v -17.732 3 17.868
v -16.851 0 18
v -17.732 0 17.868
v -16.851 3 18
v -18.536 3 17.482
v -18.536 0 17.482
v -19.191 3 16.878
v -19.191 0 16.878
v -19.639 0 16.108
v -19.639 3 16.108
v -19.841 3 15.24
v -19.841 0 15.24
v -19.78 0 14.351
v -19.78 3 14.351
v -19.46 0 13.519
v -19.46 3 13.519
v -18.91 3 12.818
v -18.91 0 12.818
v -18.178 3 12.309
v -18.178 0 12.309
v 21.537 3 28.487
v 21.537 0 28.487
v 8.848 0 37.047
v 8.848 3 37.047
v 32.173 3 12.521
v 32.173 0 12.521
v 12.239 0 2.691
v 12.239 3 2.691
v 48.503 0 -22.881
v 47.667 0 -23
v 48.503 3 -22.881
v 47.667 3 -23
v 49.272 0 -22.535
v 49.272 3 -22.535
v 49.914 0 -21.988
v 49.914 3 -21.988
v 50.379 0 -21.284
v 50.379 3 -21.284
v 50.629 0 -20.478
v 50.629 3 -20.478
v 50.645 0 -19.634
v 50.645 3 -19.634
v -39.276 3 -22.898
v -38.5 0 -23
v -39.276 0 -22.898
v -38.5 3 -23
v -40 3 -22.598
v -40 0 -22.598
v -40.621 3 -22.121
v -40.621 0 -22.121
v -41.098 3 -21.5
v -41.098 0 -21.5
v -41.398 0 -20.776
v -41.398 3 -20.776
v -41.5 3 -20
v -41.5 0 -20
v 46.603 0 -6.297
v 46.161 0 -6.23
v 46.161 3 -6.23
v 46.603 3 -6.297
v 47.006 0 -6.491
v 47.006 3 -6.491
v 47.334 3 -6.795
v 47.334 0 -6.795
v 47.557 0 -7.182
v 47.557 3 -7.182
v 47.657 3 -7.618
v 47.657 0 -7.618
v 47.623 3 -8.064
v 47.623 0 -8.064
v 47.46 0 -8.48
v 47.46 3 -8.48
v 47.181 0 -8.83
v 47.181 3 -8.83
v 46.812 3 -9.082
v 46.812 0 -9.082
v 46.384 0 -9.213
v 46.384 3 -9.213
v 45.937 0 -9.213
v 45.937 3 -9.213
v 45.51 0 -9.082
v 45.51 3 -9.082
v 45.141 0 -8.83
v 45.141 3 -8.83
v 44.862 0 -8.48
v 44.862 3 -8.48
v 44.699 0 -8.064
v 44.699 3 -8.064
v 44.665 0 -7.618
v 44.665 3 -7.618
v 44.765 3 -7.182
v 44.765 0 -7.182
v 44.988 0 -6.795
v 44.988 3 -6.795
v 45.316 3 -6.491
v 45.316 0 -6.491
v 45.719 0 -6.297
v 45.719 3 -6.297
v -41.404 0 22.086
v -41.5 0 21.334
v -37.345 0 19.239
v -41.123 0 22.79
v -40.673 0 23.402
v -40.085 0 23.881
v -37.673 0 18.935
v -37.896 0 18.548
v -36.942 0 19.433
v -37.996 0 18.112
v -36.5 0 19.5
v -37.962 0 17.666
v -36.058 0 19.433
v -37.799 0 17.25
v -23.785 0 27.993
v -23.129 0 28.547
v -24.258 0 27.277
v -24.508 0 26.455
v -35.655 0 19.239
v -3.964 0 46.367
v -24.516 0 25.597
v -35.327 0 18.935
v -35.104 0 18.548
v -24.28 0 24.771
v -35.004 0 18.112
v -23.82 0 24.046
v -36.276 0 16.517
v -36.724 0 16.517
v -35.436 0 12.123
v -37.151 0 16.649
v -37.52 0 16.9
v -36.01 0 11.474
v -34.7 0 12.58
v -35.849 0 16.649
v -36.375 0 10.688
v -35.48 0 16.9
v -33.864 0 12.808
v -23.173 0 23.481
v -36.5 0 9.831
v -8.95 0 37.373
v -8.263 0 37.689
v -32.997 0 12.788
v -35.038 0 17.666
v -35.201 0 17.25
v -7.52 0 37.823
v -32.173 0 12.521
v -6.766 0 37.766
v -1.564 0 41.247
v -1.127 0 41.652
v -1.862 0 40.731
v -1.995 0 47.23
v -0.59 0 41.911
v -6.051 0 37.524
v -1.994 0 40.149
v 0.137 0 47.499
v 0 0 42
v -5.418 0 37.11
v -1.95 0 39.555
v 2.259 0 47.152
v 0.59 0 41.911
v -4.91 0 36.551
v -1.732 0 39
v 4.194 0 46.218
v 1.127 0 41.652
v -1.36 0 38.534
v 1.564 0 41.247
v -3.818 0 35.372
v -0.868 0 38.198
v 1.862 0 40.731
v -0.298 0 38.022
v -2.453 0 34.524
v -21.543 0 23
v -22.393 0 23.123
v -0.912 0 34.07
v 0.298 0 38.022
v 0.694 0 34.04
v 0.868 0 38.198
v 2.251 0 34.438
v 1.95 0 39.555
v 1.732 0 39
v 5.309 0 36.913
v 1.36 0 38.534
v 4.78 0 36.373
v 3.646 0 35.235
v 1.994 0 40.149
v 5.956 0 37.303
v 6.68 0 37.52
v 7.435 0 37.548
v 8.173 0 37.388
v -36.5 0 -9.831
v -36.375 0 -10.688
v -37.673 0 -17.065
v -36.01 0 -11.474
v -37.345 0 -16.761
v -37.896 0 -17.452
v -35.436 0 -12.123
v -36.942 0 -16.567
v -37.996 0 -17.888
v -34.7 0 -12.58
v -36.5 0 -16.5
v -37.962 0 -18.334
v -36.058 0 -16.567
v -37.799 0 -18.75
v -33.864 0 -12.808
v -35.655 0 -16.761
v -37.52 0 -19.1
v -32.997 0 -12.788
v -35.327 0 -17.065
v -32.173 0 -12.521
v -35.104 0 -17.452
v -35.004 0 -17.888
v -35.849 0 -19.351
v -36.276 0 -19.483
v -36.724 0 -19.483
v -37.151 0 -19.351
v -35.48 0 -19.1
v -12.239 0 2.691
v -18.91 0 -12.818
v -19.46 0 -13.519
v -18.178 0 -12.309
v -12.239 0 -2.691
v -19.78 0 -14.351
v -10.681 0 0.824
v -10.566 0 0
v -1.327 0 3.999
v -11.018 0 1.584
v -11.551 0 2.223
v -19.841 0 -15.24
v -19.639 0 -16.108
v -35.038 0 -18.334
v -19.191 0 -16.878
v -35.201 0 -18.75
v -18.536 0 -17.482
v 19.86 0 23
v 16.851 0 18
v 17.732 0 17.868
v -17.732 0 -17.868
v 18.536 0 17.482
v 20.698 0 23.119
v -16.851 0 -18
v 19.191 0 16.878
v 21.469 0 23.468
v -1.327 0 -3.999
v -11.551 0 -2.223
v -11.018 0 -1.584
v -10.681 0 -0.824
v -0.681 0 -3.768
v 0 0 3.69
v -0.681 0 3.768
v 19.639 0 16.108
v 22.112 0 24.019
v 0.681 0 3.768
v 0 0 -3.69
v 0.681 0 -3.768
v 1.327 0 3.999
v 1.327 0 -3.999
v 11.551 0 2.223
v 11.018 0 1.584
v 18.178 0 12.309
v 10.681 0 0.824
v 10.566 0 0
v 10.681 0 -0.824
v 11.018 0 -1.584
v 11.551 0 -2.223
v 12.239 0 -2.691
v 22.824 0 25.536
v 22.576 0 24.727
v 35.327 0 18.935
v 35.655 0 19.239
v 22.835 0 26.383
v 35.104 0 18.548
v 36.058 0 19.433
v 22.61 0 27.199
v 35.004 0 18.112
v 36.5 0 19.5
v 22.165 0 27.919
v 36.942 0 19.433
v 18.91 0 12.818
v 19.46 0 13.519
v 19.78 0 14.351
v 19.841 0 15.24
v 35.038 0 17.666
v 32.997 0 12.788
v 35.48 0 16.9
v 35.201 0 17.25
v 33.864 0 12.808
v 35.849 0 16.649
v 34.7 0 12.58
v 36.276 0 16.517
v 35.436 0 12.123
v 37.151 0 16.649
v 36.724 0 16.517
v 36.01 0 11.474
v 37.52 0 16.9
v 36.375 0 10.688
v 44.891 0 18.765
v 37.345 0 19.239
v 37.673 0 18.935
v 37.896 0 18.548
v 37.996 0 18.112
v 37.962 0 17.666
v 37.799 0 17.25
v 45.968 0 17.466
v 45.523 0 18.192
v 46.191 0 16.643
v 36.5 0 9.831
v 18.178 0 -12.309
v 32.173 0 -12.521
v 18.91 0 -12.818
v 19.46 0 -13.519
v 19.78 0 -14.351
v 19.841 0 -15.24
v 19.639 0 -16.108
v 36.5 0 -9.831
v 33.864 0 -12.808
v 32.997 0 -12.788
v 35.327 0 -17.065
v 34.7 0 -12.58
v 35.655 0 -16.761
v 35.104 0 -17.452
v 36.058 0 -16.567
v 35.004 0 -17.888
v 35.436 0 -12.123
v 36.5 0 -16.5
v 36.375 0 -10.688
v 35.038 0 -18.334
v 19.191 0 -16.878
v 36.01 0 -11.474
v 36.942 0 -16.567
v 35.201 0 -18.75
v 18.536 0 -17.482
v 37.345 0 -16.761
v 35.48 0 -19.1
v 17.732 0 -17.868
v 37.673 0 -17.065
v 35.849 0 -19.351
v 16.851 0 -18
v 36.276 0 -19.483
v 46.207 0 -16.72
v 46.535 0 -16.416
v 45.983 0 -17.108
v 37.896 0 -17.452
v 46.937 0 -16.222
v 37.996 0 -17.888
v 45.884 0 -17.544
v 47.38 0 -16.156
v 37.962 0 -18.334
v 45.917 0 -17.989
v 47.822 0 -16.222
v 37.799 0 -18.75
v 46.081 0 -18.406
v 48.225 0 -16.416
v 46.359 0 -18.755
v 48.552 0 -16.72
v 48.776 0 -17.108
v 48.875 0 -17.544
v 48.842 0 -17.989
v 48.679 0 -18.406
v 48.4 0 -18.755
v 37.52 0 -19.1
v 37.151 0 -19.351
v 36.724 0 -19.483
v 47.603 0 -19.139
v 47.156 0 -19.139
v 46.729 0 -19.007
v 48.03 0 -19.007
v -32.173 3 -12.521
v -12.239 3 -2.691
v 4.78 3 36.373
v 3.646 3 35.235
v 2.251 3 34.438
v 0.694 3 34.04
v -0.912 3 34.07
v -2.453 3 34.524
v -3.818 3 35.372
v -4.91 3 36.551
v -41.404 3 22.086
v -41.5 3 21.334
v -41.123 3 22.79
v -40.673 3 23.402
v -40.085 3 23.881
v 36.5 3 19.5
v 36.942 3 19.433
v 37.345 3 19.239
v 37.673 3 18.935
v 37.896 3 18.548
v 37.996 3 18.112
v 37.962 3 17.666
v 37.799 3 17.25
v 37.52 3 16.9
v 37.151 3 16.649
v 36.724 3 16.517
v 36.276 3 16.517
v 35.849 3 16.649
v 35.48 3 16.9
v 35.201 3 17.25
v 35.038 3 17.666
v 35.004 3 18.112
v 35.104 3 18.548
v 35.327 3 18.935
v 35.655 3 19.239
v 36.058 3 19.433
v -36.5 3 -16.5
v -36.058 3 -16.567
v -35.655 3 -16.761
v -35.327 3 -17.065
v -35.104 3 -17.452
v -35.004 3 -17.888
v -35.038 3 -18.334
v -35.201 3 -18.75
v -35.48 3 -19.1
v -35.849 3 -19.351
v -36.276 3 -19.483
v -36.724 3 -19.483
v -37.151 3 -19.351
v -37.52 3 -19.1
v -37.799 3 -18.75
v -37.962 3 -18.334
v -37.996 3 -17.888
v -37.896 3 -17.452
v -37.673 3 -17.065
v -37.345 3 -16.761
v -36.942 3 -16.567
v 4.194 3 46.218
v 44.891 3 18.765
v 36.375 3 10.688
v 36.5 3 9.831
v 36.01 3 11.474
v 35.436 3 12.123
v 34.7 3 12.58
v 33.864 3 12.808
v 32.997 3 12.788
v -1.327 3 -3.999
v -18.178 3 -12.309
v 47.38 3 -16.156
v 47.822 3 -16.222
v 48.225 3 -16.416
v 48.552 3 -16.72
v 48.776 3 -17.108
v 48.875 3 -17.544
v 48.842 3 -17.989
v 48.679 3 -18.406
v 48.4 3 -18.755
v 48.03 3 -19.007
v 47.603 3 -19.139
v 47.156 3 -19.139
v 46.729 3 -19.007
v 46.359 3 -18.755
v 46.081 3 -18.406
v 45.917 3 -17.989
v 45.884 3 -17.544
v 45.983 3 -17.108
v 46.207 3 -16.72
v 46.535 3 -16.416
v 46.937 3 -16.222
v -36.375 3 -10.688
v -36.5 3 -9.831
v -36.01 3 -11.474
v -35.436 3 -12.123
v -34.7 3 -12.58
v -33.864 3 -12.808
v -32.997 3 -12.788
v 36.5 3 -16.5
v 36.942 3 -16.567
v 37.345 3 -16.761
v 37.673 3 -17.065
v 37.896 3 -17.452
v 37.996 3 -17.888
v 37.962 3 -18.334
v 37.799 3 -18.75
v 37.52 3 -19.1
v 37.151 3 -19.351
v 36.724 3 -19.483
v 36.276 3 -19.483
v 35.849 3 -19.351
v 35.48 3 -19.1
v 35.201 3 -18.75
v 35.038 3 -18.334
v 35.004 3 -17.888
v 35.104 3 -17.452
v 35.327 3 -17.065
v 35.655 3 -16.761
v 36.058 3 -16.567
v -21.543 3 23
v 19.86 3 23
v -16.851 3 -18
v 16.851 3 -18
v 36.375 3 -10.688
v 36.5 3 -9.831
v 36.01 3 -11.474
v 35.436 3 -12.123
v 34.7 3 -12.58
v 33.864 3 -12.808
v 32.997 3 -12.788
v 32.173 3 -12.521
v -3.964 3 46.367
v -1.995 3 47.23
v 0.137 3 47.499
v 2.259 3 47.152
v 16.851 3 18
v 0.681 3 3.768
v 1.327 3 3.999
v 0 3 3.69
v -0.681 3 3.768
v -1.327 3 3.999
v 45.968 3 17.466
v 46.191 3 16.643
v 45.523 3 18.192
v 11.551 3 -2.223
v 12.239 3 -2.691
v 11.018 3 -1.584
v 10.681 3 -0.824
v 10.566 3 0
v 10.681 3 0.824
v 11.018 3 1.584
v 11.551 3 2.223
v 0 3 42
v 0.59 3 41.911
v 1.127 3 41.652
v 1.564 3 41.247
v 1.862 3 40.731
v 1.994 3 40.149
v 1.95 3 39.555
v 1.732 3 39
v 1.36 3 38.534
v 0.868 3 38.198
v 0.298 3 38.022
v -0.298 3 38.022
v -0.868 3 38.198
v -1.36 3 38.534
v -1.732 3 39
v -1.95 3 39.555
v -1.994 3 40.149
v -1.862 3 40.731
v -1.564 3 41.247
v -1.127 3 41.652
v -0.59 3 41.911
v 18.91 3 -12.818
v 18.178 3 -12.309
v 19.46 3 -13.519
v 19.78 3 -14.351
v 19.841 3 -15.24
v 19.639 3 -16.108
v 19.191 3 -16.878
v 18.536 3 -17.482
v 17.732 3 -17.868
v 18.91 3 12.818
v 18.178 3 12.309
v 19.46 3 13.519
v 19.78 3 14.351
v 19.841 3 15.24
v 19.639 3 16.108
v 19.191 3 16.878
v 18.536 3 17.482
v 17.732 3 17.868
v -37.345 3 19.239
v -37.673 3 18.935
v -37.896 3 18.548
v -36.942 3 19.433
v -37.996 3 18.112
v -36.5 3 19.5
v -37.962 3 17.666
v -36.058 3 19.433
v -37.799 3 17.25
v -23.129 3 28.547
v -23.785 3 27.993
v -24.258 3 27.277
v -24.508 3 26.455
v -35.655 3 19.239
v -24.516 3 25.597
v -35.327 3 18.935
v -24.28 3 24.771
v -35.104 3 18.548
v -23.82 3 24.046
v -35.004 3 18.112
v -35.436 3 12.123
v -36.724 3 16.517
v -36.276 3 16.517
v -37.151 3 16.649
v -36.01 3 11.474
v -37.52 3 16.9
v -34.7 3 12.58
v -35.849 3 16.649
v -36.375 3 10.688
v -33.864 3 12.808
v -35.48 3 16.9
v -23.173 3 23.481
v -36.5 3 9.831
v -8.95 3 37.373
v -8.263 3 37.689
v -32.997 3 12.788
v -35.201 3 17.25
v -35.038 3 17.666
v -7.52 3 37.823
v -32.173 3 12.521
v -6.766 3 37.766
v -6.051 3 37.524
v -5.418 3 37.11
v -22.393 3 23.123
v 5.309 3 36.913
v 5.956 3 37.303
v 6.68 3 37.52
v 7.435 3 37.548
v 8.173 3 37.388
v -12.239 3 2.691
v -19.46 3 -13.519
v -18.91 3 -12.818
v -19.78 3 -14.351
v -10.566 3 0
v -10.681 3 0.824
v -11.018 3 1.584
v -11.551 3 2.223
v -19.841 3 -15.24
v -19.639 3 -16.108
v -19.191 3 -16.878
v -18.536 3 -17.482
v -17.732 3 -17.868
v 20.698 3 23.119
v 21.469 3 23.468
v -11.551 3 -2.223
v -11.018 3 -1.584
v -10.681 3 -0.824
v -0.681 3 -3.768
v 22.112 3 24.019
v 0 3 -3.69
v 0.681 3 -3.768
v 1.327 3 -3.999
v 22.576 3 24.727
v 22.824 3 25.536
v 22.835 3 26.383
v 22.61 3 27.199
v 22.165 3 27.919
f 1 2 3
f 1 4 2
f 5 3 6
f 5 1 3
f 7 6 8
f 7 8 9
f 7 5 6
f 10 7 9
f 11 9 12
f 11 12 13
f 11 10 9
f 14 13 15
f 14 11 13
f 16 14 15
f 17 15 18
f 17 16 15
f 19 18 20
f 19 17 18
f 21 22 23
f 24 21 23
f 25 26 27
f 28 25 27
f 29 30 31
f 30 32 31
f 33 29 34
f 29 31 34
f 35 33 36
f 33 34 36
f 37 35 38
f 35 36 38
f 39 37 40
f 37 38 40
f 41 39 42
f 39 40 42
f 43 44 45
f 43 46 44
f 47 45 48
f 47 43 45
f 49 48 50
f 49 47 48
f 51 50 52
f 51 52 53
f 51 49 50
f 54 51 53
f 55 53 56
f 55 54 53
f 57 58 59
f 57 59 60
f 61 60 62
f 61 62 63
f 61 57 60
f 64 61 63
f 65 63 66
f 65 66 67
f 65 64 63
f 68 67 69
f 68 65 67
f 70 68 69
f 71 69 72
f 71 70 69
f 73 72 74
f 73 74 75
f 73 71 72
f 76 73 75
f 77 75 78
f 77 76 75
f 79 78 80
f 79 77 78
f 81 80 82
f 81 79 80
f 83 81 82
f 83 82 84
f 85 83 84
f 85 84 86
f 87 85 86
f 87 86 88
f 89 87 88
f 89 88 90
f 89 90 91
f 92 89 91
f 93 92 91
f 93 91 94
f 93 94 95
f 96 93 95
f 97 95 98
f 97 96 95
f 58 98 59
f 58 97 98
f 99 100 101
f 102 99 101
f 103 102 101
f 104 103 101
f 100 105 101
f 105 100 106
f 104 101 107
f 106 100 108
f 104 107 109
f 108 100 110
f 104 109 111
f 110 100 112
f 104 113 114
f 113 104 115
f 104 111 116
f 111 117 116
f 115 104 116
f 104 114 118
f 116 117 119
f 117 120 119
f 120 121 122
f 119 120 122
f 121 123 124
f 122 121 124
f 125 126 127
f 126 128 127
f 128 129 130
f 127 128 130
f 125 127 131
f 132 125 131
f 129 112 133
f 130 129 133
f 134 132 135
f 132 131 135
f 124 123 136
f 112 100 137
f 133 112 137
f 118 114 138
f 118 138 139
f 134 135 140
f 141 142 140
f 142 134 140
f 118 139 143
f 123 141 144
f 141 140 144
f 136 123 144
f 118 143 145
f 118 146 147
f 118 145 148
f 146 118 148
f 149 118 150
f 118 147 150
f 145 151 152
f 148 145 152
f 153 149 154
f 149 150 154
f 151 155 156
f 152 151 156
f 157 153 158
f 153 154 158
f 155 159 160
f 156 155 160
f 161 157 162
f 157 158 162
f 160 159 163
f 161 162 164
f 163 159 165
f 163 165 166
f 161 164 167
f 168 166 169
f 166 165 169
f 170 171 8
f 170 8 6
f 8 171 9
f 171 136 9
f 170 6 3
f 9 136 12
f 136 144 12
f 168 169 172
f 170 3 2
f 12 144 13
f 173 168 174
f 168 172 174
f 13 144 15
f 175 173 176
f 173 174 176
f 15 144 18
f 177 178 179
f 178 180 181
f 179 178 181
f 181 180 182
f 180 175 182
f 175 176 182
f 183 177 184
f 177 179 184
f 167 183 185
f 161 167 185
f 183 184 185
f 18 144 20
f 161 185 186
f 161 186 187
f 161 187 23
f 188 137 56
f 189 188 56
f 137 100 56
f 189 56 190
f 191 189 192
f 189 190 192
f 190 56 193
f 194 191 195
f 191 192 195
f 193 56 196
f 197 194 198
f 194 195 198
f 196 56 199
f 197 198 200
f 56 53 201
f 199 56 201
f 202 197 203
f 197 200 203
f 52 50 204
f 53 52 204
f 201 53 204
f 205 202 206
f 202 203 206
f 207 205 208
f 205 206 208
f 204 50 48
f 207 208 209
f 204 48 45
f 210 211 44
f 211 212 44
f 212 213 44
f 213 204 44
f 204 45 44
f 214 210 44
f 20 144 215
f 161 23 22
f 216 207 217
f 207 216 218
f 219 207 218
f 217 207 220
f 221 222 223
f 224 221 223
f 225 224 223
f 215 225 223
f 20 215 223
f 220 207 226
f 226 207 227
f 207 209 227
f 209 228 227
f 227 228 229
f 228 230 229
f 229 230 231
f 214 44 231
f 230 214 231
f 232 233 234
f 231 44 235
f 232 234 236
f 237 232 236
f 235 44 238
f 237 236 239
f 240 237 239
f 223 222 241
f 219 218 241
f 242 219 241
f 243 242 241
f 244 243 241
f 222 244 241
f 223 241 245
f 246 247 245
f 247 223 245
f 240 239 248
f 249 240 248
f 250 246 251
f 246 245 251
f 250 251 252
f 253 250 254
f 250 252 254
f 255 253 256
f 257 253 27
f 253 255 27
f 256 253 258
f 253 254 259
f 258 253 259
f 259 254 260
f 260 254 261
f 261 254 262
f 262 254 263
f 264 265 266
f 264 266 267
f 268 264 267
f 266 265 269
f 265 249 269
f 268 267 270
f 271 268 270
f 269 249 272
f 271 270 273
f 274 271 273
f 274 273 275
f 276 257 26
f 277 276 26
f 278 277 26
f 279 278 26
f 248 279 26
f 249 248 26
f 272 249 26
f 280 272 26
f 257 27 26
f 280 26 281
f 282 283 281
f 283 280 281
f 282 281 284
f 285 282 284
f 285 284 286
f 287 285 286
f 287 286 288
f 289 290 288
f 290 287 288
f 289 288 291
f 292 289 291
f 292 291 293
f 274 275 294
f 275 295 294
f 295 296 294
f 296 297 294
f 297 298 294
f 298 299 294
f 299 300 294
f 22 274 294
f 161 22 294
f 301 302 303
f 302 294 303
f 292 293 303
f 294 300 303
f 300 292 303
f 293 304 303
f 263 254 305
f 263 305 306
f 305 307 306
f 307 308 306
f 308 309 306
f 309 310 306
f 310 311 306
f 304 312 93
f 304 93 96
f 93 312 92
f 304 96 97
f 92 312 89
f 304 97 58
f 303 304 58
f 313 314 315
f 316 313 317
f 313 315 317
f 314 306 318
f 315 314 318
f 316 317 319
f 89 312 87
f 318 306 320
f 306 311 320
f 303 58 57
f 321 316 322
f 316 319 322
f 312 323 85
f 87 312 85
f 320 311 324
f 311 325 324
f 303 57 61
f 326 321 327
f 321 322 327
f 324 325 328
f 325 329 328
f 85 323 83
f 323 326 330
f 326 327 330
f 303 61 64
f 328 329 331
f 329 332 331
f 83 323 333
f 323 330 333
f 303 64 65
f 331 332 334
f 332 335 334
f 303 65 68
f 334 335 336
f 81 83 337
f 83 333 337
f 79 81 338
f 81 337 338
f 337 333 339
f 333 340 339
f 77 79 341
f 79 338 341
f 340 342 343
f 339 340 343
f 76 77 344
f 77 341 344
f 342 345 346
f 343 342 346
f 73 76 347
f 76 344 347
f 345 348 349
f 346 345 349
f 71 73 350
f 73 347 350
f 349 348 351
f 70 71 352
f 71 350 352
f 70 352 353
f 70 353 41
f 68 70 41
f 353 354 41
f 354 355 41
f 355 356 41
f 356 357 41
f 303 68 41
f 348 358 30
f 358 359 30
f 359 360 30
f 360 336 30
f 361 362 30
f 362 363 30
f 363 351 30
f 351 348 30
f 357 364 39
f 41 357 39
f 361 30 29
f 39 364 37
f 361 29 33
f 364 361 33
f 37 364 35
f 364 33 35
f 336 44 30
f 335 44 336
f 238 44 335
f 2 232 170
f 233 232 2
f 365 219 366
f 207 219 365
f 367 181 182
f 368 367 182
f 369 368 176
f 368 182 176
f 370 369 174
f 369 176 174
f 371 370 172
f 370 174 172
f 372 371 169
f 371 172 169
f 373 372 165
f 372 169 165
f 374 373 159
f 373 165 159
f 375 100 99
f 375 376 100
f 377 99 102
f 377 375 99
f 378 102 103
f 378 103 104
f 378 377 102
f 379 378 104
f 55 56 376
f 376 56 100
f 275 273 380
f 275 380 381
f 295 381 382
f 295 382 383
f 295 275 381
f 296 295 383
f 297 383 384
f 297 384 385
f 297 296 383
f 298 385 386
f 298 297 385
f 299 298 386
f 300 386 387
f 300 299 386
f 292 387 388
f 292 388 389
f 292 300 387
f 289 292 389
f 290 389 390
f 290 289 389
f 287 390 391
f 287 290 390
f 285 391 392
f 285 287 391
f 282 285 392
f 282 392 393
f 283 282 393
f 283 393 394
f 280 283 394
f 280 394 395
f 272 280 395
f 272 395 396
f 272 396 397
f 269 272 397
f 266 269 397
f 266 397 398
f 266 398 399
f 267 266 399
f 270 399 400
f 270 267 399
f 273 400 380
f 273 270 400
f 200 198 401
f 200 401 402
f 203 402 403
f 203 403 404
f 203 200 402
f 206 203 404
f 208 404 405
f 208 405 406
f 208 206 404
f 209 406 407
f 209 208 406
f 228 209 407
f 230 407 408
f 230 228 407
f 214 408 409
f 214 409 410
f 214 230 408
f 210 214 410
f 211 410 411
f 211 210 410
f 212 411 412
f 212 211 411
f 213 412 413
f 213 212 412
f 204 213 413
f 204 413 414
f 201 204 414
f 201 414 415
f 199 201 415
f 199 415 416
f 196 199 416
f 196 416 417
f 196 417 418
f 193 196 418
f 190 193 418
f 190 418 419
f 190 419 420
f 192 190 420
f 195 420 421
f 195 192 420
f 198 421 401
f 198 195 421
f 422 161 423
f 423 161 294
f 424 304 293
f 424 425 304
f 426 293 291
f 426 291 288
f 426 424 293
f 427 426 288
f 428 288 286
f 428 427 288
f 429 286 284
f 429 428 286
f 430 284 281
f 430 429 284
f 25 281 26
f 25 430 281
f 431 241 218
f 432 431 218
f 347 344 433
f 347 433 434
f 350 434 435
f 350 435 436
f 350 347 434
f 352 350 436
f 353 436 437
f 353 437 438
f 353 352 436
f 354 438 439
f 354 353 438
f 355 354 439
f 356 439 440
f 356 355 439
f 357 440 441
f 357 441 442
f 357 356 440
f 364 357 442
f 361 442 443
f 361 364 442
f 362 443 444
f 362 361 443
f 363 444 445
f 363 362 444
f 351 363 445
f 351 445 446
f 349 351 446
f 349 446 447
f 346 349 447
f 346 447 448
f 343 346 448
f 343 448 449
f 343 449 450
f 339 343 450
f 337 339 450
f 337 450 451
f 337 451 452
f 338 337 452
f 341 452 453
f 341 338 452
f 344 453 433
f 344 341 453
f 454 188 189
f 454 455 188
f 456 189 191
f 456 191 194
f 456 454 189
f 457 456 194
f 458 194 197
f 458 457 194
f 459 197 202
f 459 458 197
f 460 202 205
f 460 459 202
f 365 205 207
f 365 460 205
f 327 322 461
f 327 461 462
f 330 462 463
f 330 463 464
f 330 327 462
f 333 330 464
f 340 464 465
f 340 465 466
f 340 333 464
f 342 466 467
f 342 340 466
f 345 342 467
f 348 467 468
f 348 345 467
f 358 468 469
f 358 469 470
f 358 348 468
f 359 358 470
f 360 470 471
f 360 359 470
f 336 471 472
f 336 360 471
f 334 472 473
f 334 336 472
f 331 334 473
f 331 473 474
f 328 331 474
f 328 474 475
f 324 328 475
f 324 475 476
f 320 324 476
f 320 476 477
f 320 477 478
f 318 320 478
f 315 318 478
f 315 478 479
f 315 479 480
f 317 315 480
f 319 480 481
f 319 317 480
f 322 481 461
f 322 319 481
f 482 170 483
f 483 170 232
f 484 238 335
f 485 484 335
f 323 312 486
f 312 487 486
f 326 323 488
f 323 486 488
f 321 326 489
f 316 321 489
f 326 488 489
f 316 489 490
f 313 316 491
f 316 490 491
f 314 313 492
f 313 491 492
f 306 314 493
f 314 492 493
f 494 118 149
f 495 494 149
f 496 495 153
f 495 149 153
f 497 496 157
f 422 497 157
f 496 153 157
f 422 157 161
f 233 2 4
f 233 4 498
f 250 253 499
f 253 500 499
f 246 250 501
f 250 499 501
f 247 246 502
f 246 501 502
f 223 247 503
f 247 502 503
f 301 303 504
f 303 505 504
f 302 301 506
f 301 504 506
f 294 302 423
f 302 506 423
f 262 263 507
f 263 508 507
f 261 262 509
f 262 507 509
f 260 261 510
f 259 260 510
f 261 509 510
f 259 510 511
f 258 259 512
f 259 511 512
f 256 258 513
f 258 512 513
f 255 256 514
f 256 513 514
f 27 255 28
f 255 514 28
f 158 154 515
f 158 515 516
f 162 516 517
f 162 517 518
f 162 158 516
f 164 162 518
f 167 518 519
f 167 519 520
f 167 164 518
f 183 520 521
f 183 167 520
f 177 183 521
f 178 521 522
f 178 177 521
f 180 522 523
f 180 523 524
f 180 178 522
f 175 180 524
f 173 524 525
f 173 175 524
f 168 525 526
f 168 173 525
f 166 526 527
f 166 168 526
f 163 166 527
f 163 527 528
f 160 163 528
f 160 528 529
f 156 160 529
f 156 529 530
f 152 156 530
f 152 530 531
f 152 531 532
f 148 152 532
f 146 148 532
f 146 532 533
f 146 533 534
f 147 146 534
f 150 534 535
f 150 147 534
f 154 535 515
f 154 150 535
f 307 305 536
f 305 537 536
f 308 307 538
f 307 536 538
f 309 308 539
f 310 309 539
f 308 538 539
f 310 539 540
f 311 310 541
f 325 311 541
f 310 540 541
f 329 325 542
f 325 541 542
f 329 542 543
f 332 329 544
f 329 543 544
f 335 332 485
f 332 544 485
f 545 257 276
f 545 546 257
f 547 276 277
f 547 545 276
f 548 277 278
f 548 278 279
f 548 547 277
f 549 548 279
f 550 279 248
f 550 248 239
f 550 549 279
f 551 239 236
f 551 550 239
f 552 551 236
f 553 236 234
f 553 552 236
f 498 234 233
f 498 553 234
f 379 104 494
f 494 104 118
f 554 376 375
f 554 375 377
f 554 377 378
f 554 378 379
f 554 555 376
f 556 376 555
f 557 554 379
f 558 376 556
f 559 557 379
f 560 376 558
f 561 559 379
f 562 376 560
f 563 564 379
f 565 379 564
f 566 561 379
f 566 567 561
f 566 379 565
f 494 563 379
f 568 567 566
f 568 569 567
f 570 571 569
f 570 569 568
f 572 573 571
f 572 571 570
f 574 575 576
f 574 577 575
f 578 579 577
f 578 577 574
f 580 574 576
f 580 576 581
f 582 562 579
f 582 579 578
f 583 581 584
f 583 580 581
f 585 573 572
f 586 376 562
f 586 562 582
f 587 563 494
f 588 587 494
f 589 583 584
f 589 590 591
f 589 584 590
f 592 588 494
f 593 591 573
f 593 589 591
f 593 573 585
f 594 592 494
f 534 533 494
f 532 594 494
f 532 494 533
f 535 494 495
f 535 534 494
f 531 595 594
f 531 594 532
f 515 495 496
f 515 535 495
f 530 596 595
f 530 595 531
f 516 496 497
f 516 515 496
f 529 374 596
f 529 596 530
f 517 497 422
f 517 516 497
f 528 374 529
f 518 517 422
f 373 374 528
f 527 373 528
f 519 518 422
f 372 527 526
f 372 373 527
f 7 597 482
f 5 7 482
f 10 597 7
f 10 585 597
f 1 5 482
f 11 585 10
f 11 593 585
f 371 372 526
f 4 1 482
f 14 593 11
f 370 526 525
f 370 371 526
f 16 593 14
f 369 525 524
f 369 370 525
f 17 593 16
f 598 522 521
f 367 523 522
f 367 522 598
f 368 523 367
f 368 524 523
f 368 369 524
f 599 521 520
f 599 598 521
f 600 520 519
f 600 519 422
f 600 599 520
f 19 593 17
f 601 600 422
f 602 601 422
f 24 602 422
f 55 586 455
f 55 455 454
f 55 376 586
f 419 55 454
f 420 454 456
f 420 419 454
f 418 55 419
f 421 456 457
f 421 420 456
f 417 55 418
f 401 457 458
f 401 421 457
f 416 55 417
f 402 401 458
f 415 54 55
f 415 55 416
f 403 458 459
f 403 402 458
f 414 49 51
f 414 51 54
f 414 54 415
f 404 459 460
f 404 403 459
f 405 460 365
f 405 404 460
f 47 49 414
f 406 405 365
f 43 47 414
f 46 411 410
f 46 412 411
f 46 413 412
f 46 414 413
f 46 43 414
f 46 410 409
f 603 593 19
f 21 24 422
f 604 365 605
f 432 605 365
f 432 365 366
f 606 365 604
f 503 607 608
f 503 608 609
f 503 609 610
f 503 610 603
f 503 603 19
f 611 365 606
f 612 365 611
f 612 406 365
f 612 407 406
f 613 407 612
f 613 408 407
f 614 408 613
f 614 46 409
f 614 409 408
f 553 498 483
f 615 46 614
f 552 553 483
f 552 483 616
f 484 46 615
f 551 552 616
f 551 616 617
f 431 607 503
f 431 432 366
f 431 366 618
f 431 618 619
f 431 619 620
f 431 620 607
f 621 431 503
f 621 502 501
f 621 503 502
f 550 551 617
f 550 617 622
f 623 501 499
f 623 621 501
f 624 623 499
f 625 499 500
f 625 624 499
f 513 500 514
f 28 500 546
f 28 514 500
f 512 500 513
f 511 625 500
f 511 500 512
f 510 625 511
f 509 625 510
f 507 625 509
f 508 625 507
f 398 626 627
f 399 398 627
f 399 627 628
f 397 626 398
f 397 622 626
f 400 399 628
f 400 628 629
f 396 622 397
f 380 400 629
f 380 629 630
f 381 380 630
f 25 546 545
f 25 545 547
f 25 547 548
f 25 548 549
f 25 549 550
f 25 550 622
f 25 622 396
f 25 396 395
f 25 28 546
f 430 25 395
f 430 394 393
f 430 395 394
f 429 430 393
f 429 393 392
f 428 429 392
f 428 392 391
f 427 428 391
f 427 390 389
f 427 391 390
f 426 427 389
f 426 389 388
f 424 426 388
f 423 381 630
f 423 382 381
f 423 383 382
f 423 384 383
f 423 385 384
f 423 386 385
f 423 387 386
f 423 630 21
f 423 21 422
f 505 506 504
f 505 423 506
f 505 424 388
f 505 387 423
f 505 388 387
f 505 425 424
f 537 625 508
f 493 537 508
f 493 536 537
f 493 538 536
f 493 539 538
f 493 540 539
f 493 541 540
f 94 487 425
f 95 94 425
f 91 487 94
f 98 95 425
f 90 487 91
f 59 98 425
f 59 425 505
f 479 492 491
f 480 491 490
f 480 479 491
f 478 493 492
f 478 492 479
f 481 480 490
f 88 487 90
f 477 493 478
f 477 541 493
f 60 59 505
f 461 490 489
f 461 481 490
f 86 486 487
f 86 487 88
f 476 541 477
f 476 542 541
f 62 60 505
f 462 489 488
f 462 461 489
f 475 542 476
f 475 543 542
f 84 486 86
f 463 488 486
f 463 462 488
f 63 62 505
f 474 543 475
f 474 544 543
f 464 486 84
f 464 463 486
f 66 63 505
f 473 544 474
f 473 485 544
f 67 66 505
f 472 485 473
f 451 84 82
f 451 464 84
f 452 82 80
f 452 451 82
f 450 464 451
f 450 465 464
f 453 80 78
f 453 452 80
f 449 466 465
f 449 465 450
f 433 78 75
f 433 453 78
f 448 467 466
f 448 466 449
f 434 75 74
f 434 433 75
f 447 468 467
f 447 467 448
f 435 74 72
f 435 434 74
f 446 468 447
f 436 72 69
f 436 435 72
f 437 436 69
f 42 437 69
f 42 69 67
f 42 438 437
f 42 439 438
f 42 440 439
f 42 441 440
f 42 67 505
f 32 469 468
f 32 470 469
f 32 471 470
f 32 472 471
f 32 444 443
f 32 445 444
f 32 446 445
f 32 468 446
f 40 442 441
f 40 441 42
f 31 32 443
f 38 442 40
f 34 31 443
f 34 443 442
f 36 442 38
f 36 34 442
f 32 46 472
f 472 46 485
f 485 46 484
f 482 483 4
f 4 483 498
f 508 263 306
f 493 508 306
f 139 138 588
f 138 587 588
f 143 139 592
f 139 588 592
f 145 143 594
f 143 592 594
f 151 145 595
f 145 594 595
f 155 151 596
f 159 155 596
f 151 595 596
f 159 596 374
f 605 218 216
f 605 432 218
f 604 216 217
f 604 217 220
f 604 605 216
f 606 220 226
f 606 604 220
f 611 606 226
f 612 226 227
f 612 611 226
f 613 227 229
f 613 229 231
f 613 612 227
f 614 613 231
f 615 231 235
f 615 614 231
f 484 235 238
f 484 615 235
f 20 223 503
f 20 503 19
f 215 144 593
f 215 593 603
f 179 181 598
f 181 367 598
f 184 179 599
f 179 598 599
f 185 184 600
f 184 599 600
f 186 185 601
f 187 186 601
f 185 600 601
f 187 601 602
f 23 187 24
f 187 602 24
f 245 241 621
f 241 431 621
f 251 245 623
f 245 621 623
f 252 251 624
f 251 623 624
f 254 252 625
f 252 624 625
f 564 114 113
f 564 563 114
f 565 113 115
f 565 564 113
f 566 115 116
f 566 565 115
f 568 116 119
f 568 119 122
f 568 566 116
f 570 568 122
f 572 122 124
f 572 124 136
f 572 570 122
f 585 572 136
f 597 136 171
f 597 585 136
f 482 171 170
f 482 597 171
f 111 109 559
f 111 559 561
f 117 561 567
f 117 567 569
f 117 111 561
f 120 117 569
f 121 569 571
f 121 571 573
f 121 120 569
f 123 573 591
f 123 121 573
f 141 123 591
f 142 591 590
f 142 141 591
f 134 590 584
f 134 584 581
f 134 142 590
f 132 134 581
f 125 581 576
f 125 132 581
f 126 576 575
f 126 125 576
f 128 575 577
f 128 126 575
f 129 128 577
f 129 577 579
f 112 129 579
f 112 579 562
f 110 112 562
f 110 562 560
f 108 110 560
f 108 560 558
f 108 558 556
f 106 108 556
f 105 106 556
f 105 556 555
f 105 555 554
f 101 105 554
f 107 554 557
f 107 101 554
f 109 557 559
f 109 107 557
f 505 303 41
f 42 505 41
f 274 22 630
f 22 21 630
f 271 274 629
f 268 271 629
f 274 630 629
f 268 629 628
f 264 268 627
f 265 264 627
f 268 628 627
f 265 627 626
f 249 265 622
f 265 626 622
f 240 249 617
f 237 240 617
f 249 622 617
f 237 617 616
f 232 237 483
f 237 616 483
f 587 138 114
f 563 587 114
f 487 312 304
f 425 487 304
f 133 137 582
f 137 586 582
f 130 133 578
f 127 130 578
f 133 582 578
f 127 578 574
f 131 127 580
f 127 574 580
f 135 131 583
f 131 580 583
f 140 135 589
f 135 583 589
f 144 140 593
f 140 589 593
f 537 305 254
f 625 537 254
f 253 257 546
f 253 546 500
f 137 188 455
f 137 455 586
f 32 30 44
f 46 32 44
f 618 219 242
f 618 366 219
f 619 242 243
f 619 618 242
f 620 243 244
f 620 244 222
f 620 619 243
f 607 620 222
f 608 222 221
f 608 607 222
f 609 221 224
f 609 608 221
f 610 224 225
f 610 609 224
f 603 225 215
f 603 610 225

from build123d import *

# Parameters (mm, degrees)
SKETCH_1_R      = 1.5
SKETCH_1_R_2    = 2
EXTRUDE_1_DEPTH = 3
FILLET_1_R      = 3


with BuildPart() as part:
    # 草图1 → 凸台-拉伸1 (new body)
    with BuildSketch(Plane(origin=(0, 0, 0), x_dir=(1, 0, 0), z_dir=(0, 1, 0))):
        with BuildLine():
            Line((51.058349832, 23), (-41.5, 23))
            Line((-41.5, 23), (-41.5, -23))
            Line((-41.5, -23), (-3.963622721, -46.367078995))
            ThreePointArc((-3.963622721, -46.367078995), (0.137420172, -47.498740941), (4.194246234, -46.217579797))
            Line((4.194246234, -46.217579797), (46.024182835, -18))
            Line((46.024182835, -18), (51.058349832, 23))
        make_face()
        with Locations(Location((-36.5, 18, 0), (0, 0, 270))):
            Circle(SKETCH_1_R, mode=Mode.SUBTRACT)
        with Locations(Location((36.5, 18, 0), (0, 0, 270))):
            Circle(SKETCH_1_R, mode=Mode.SUBTRACT)
        with Locations(Location((36.5, -18, 0), (0, 0, 270))):
            Circle(SKETCH_1_R, mode=Mode.SUBTRACT)
        with Locations(Location((-36.5, -18, 0), (0, 0, 270))):
            Circle(SKETCH_1_R, mode=Mode.SUBTRACT)
        with Locations(Location((0, -40, 0), (0, 0, 270))):
            Circle(SKETCH_1_R_2, mode=Mode.SUBTRACT)
        with Locations(Location((46.160921266, 7.730172301, 0), (0, 0, 270))):
            Circle(SKETCH_1_R, mode=Mode.SUBTRACT)
        with Locations(Location((47.3796147, 17.655633817, 0), (0, 0, 270))):
            Circle(SKETCH_1_R, mode=Mode.SUBTRACT)
        Polygon((-29.717158085, 18), (29.717158085, 18), (0, 3.344963136), align=None, mode=Mode.SUBTRACT)
        Polygon((-36.5, 14.655036864), (-36.5, -14.655036864), (-6.782841915, 0), align=None, mode=Mode.SUBTRACT)
        Polygon((29.717158085, -18), (0, -3.344963136), (-29.717158085, -18), align=None, mode=Mode.SUBTRACT)
        Polygon((36.5, -14.655036864), (6.782841915, 0), (36.5, 14.655036864), align=None, mode=Mode.SUBTRACT)
        with BuildLine():
            Line((-32.038958261, -23), (29.671328196, -23))
            Line((29.671328196, -23), (5.919801281, -39.022271619))
            ThreePointArc((5.919801281, -39.022271619), (-0.109936138, -34.001007247), (-5.951649691, -39.239825052))
            Line((-5.951649691, -39.239825052), (-32.038958261, -23))
        make_face(mode=Mode.SUBTRACT)
    extrude(amount=EXTRUDE_1_DEPTH)

    # 圆角1
    fillet_1_edges = [part.edges().sort_by_distance(p)[0] for p in [
        (-41.5, 1.5, 23),
        (-41.5, 1.5, -23),
        (51.058349832, 1.5, -23),
        (46.024182835, 1.5, 18),
        (-32.038958261, 1.5, 23),
        (-5.951649691, 1.5, 39.239825052),
        (5.919801281, 1.5, 39.022271619),
        (29.671328196, 1.5, 23),
        (-29.717158085, 1.5, -18),
        (0, 1.5, -3.344963136),
        (29.717158085, 1.5, -18),
        (-6.782841915, 1.5, 0),
        (-36.5, 1.5, -14.655036864),
        (-36.5, 1.5, 14.655036864),
        (-29.717158085, 1.5, 18),
        (29.717158085, 1.5, 18),
        (0, 1.5, 3.344963136),
        (36.5, 1.5, 14.655036864),
        (36.5, 1.5, -14.655036864),
        (6.782841915, 1.5, 0),
    ]]
    fillet(fillet_1_edges, radius=FILLET_1_R)


solid = part.part
